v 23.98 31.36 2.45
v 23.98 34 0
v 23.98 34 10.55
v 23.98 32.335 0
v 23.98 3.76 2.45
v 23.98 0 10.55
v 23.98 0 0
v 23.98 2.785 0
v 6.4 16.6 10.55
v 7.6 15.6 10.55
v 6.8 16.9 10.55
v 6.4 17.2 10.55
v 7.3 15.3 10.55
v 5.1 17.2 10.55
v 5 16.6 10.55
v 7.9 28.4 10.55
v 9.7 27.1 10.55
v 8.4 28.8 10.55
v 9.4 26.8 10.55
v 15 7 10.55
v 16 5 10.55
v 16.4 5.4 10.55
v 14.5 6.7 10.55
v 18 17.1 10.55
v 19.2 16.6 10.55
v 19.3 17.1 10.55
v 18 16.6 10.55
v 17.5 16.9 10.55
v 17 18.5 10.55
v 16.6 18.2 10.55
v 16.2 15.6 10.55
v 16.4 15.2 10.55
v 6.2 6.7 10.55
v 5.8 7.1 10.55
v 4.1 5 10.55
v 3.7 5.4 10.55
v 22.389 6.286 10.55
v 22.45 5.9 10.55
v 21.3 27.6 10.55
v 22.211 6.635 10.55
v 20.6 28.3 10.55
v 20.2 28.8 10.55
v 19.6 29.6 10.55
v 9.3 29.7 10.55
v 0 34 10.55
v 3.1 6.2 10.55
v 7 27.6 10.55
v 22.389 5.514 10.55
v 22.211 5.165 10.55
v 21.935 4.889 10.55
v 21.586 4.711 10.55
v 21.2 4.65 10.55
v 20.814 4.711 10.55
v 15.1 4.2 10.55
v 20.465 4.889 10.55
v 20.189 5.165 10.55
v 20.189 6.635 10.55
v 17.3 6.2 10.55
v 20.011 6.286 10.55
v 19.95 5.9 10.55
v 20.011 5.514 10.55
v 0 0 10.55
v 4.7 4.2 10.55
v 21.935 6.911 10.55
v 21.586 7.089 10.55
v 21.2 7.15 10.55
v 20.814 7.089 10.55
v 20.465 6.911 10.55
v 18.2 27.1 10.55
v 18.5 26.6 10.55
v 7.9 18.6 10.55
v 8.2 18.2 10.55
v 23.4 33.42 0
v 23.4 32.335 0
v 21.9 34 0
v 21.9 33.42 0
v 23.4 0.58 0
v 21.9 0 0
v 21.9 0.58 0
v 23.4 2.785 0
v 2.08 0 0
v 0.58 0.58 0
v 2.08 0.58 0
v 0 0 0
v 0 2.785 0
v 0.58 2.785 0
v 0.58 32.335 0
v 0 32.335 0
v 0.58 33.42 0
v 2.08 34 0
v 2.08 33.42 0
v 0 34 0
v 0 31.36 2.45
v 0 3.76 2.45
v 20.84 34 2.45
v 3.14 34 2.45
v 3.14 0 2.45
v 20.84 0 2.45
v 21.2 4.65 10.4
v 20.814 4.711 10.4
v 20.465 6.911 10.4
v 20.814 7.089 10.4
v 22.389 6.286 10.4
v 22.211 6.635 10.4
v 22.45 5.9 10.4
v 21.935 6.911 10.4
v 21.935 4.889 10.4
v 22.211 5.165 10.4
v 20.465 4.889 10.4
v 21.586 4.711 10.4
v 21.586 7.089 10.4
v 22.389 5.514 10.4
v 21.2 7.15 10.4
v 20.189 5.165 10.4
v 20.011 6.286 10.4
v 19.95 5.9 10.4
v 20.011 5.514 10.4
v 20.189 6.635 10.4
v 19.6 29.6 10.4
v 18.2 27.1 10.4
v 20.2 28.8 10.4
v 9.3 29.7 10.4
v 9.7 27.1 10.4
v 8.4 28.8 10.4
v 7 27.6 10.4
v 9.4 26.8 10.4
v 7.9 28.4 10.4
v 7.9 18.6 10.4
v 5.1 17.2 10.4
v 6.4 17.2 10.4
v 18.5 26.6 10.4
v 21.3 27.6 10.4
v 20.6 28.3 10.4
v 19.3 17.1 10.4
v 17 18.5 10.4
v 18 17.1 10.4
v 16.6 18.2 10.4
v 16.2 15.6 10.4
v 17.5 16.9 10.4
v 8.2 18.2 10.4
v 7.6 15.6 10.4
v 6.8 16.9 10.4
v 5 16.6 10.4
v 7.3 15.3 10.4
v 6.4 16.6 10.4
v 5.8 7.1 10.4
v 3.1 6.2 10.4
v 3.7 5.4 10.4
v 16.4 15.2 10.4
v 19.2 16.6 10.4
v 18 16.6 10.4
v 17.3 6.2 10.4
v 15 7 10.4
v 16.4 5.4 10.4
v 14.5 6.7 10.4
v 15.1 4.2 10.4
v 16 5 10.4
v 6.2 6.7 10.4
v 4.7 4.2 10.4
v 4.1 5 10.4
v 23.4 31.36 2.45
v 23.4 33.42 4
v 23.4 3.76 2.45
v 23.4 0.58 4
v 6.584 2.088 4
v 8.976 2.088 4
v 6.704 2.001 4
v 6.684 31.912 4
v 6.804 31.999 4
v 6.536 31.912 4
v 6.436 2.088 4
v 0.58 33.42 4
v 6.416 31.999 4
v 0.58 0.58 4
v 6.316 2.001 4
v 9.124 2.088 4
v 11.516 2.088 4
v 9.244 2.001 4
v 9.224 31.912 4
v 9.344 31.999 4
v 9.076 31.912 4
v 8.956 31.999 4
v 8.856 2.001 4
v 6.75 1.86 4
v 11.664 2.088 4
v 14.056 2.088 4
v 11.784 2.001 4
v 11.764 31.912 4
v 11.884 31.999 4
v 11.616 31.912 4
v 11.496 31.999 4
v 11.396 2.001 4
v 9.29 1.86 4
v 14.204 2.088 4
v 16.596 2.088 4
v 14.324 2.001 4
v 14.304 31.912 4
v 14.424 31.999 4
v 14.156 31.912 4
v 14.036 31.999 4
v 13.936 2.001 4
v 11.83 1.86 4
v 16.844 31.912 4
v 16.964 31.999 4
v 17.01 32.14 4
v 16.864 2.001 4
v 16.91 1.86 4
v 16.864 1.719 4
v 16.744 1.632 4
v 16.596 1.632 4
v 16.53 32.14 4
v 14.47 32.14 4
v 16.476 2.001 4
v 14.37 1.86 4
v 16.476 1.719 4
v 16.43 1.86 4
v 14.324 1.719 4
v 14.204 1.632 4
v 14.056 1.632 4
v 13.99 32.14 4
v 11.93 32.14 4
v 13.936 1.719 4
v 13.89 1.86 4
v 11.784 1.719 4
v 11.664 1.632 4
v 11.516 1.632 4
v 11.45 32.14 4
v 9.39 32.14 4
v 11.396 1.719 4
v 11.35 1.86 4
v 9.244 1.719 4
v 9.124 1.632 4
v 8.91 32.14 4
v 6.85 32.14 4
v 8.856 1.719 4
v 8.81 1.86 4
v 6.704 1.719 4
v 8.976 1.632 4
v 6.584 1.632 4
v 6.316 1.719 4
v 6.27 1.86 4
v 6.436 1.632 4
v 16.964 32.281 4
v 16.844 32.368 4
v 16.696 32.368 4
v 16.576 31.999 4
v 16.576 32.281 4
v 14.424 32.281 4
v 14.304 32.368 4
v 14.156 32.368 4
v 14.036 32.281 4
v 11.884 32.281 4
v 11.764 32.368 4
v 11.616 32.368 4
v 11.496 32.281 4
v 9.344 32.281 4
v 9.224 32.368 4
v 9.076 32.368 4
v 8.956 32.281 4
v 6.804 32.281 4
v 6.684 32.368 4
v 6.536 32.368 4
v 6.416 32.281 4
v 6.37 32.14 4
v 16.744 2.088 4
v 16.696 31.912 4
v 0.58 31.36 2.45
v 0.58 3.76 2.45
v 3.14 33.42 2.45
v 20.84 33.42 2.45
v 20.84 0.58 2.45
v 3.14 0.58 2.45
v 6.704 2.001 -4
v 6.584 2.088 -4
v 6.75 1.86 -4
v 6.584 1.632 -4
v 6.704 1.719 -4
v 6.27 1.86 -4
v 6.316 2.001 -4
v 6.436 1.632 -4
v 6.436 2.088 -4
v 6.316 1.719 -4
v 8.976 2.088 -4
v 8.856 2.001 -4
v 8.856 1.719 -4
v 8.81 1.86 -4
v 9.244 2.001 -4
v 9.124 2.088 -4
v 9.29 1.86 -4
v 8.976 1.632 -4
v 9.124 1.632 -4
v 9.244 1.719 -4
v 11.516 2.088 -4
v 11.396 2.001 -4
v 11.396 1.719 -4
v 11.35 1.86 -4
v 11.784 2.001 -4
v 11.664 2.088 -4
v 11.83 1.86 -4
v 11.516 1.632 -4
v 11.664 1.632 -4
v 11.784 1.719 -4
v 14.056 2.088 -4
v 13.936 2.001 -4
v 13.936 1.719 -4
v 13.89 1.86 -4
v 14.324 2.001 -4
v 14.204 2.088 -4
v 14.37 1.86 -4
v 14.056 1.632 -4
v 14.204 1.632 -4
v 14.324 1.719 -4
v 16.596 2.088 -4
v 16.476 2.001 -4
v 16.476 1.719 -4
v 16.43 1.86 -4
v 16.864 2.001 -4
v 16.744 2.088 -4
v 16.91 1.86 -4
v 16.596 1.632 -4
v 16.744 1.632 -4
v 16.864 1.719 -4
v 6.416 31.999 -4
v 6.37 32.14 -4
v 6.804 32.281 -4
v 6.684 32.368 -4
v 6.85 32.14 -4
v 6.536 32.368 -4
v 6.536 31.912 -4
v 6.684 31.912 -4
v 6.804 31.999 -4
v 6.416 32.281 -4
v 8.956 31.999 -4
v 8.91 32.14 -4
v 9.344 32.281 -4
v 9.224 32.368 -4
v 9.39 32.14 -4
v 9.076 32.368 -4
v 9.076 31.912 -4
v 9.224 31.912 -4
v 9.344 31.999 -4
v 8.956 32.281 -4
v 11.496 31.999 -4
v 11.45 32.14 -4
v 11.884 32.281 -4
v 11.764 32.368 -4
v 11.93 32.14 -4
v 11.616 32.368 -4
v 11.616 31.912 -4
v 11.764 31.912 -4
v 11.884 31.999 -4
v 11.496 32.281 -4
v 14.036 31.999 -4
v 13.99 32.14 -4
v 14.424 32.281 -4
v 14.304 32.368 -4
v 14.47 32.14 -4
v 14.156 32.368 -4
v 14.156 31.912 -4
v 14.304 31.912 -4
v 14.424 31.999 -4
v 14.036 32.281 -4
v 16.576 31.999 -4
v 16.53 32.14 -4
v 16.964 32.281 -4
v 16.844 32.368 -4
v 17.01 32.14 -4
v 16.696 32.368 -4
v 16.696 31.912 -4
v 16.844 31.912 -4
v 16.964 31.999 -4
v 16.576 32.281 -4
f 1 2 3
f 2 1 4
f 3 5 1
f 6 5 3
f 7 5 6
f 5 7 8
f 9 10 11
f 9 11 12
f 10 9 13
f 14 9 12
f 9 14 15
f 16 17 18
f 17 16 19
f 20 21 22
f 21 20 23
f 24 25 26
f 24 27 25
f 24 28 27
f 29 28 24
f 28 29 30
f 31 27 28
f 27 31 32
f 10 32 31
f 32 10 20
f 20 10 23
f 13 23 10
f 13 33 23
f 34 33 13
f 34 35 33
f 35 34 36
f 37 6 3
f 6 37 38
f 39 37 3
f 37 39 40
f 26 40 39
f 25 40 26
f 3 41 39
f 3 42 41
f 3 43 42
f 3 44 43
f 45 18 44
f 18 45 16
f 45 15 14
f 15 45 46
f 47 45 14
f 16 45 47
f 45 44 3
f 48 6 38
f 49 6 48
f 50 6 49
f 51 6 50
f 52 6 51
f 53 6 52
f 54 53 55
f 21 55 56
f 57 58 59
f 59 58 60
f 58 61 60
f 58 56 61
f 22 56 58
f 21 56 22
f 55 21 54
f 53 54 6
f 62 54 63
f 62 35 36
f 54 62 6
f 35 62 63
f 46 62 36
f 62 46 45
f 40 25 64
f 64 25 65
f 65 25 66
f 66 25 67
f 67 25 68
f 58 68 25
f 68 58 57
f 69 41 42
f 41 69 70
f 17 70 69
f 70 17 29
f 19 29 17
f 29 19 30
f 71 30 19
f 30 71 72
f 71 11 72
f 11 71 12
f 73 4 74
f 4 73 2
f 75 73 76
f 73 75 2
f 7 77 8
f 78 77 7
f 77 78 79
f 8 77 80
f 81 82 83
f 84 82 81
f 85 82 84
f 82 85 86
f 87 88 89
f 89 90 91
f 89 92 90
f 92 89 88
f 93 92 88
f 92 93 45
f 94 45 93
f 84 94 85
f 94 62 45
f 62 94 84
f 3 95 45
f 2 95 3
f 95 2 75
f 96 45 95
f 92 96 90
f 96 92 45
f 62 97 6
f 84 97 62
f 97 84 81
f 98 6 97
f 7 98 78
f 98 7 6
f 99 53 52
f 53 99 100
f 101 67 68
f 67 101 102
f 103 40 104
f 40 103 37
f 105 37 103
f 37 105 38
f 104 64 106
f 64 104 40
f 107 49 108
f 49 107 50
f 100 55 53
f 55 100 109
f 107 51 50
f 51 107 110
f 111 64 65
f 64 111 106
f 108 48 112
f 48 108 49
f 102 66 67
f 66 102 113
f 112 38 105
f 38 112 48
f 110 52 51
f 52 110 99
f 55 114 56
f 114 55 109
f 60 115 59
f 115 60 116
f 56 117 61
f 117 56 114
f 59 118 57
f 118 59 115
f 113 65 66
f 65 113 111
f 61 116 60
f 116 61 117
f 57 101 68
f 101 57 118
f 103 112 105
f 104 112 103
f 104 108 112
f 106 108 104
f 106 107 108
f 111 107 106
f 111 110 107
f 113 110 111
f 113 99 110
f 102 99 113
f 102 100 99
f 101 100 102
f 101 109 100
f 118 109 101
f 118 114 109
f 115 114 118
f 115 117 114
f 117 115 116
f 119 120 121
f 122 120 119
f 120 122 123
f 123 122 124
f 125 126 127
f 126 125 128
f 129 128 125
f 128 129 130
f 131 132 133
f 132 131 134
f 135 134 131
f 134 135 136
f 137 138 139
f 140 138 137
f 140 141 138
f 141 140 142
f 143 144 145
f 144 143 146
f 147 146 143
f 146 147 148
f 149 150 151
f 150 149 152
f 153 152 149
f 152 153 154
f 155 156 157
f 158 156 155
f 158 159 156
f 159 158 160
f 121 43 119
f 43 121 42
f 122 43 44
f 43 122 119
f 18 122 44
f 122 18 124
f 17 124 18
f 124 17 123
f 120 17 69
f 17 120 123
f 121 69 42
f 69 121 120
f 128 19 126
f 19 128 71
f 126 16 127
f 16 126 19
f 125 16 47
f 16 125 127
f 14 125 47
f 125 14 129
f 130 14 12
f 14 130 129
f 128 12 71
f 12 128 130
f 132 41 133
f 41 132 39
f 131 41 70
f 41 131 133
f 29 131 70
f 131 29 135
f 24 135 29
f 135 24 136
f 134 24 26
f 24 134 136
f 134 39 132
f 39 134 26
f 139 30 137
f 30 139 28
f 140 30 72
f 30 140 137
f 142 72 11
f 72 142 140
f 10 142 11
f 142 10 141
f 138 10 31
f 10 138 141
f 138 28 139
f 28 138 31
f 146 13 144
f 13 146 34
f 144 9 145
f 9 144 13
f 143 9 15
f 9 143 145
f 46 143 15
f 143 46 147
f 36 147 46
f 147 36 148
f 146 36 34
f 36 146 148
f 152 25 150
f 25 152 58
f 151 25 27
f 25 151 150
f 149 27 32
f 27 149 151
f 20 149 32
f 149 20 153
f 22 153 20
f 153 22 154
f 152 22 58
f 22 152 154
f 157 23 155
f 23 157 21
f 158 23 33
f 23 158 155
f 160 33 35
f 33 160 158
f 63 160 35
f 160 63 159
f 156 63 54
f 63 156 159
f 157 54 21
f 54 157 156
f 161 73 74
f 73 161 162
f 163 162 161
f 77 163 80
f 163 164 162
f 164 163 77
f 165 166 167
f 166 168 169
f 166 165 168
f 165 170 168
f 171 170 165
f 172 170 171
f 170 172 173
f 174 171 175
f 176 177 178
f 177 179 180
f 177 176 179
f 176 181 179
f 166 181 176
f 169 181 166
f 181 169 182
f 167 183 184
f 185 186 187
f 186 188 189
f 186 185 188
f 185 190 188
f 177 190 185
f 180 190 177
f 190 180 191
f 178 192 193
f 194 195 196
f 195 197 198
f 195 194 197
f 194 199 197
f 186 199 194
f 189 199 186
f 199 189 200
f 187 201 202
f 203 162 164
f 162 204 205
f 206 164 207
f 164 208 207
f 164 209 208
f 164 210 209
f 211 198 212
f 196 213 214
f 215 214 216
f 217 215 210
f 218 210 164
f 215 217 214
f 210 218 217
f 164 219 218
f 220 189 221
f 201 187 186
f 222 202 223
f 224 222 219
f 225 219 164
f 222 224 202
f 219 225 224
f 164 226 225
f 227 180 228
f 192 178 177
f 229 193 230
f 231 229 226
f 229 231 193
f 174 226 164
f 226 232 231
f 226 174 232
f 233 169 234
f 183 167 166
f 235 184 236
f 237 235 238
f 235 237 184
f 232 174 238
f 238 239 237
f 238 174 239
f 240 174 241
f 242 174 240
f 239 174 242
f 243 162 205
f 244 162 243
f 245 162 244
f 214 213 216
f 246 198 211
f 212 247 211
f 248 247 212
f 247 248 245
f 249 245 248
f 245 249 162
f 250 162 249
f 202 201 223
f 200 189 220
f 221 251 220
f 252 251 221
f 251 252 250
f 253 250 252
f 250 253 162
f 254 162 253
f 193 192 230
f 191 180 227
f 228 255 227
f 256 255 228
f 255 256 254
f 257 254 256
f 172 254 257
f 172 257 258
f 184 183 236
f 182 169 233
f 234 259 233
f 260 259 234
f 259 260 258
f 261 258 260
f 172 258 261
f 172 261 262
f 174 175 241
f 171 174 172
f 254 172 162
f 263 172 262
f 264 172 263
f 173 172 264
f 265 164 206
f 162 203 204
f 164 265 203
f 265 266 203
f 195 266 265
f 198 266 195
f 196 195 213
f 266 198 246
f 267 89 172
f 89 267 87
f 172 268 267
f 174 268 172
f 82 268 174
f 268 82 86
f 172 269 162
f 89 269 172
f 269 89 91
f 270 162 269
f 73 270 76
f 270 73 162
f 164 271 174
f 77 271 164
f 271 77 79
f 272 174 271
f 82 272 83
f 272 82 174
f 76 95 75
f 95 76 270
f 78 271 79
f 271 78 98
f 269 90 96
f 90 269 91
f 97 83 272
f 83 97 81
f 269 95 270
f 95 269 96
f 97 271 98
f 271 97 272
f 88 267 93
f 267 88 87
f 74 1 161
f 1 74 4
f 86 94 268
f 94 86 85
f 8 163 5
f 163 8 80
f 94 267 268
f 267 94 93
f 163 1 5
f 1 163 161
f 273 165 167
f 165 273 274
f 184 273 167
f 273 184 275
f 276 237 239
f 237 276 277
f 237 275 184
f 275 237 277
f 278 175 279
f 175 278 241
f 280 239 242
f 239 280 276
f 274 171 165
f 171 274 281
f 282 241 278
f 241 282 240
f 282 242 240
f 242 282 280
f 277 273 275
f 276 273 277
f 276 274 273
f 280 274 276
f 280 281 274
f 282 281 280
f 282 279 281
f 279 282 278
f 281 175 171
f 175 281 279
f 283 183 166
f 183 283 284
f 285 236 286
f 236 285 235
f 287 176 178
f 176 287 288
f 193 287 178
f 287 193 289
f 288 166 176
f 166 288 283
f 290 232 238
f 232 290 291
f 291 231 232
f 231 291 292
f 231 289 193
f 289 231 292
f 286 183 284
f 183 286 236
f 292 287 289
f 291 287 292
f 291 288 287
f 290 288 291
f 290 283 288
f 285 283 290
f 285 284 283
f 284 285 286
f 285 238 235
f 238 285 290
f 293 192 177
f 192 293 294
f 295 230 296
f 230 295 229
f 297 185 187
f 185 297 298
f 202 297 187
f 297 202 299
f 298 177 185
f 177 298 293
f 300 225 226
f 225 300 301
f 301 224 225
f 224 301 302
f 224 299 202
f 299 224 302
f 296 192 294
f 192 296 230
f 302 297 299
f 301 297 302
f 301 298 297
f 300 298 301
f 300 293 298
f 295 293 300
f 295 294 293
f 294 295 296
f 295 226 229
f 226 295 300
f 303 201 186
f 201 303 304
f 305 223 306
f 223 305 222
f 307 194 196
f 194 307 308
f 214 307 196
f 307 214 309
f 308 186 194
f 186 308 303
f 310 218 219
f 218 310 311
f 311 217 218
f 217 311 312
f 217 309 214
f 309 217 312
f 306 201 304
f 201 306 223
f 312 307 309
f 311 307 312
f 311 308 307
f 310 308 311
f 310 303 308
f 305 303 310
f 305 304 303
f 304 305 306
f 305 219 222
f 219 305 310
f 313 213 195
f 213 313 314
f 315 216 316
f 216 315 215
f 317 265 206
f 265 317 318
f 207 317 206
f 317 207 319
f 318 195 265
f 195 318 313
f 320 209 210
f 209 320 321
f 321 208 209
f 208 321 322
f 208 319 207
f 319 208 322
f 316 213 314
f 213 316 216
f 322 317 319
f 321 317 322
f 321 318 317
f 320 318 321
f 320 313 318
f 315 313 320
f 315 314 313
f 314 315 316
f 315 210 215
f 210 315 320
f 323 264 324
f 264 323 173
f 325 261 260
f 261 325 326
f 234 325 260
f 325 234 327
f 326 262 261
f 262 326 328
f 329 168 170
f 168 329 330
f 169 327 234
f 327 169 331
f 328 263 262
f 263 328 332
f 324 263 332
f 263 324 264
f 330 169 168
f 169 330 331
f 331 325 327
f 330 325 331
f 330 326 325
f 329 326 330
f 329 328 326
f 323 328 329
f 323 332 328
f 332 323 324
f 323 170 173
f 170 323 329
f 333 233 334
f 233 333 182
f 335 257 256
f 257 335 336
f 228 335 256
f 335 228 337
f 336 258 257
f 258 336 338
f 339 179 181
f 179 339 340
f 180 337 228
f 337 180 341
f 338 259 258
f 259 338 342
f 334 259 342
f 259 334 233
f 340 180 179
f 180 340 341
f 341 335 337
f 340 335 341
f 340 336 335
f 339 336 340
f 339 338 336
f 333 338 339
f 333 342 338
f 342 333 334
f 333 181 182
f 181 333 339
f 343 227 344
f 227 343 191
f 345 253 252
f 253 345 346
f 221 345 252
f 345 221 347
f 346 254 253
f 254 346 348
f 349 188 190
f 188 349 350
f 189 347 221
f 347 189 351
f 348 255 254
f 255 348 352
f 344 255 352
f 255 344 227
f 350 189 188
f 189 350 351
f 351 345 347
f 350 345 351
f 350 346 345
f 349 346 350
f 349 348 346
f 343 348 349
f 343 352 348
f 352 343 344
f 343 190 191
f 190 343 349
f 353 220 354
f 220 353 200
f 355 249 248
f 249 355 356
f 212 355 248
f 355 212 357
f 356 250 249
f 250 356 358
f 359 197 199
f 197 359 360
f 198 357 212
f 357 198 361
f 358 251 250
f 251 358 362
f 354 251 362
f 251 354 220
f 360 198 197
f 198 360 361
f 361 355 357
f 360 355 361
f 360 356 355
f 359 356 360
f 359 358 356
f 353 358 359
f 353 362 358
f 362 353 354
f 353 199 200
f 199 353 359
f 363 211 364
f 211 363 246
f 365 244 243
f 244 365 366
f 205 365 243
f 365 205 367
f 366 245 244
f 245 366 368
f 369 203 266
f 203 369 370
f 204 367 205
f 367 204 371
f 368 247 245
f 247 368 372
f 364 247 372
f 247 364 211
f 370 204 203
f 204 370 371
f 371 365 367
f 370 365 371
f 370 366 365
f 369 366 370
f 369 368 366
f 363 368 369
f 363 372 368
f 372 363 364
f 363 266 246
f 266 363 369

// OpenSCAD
w = 23.98;
h = 34;
d = 10.55;

t = 0.58;
u= d-8.1+1.55;

difference(){

    cube( [w,h,d] );

    //translate([0,0,11]) scale([w/211,h/299,-0.01]) %surface("7SegDigit-300.png");
    

    translate([21.2,5.9,10.4])
    scale([1.25,1.25,1])
    cylinder($fn=20);
    
    translate([0,0,10.4])
    linear_extrude(height=1)
    scale(0.1) {
        polygon([[47,42],[151,42],[160,50],[145,67],[62,67],[41,50]]);
        
        polygon([[37,54],[31,62],[50,166],[64,166],[73,153],[58,71]]);
        
        polygon([[164,54],[150,70],[164,152],[180,166],[192,166],[173,62]]);
        
        polygon([[76,156],[162,156],[175,169],[166,182],[82,182],[68,169]]);
        
        polygon([[51,172],[64,172],[79,186],[94,268],[79,284],[70,276]]);
        
        polygon([[180,171],[193,171],[213,276],[206,283],[185,266],[170,185]]);

        polygon([[97,271],[182,271],[202,288],[196,296],[93,297],[84,288]]);
        
    }
    
    translate([t,t,0])
    cube([w-2*t,h-2*t,u]);
    
    cutout1();
    cutout2();
}



module cutout1() {
    wt=17.7;
    wb=19.82;
    wc=(wb-wt)/2;
    wd=d-8.1;

    we = (w-wb)/2;
    
    
    translate([we,80,0])
    rotate([90,0,0])
    linear_extrude() polygon([[0,0],[wb,0],[wt+wc,wd],[wc,wd]]);
}

module cutout2() {
    wt=27.6;
    wb=29.55;
    wc=(wb-wt)/2;
    wd=d-8.1;

    we = (w-wb)/2;
    
    
    translate([-10,-we,0])
    rotate([90,0,90])
    linear_extrude() polygon([[0,0],[wb,0],[wt+wc,wd],[wc,wd]]);
}


pinr=0.48/2;

module pin(x,y){
    translate([x,y,u-8])

    cylinder(r=pinr,h=8,$fn=10);
}


for (i=[0:4])
    pin(6.75 -pinr + i*2.54, 2.1-pinr);


for (i=[0:4])
    pin( 6.85 -pinr + i*2.54, h-(2.1-pinr));
